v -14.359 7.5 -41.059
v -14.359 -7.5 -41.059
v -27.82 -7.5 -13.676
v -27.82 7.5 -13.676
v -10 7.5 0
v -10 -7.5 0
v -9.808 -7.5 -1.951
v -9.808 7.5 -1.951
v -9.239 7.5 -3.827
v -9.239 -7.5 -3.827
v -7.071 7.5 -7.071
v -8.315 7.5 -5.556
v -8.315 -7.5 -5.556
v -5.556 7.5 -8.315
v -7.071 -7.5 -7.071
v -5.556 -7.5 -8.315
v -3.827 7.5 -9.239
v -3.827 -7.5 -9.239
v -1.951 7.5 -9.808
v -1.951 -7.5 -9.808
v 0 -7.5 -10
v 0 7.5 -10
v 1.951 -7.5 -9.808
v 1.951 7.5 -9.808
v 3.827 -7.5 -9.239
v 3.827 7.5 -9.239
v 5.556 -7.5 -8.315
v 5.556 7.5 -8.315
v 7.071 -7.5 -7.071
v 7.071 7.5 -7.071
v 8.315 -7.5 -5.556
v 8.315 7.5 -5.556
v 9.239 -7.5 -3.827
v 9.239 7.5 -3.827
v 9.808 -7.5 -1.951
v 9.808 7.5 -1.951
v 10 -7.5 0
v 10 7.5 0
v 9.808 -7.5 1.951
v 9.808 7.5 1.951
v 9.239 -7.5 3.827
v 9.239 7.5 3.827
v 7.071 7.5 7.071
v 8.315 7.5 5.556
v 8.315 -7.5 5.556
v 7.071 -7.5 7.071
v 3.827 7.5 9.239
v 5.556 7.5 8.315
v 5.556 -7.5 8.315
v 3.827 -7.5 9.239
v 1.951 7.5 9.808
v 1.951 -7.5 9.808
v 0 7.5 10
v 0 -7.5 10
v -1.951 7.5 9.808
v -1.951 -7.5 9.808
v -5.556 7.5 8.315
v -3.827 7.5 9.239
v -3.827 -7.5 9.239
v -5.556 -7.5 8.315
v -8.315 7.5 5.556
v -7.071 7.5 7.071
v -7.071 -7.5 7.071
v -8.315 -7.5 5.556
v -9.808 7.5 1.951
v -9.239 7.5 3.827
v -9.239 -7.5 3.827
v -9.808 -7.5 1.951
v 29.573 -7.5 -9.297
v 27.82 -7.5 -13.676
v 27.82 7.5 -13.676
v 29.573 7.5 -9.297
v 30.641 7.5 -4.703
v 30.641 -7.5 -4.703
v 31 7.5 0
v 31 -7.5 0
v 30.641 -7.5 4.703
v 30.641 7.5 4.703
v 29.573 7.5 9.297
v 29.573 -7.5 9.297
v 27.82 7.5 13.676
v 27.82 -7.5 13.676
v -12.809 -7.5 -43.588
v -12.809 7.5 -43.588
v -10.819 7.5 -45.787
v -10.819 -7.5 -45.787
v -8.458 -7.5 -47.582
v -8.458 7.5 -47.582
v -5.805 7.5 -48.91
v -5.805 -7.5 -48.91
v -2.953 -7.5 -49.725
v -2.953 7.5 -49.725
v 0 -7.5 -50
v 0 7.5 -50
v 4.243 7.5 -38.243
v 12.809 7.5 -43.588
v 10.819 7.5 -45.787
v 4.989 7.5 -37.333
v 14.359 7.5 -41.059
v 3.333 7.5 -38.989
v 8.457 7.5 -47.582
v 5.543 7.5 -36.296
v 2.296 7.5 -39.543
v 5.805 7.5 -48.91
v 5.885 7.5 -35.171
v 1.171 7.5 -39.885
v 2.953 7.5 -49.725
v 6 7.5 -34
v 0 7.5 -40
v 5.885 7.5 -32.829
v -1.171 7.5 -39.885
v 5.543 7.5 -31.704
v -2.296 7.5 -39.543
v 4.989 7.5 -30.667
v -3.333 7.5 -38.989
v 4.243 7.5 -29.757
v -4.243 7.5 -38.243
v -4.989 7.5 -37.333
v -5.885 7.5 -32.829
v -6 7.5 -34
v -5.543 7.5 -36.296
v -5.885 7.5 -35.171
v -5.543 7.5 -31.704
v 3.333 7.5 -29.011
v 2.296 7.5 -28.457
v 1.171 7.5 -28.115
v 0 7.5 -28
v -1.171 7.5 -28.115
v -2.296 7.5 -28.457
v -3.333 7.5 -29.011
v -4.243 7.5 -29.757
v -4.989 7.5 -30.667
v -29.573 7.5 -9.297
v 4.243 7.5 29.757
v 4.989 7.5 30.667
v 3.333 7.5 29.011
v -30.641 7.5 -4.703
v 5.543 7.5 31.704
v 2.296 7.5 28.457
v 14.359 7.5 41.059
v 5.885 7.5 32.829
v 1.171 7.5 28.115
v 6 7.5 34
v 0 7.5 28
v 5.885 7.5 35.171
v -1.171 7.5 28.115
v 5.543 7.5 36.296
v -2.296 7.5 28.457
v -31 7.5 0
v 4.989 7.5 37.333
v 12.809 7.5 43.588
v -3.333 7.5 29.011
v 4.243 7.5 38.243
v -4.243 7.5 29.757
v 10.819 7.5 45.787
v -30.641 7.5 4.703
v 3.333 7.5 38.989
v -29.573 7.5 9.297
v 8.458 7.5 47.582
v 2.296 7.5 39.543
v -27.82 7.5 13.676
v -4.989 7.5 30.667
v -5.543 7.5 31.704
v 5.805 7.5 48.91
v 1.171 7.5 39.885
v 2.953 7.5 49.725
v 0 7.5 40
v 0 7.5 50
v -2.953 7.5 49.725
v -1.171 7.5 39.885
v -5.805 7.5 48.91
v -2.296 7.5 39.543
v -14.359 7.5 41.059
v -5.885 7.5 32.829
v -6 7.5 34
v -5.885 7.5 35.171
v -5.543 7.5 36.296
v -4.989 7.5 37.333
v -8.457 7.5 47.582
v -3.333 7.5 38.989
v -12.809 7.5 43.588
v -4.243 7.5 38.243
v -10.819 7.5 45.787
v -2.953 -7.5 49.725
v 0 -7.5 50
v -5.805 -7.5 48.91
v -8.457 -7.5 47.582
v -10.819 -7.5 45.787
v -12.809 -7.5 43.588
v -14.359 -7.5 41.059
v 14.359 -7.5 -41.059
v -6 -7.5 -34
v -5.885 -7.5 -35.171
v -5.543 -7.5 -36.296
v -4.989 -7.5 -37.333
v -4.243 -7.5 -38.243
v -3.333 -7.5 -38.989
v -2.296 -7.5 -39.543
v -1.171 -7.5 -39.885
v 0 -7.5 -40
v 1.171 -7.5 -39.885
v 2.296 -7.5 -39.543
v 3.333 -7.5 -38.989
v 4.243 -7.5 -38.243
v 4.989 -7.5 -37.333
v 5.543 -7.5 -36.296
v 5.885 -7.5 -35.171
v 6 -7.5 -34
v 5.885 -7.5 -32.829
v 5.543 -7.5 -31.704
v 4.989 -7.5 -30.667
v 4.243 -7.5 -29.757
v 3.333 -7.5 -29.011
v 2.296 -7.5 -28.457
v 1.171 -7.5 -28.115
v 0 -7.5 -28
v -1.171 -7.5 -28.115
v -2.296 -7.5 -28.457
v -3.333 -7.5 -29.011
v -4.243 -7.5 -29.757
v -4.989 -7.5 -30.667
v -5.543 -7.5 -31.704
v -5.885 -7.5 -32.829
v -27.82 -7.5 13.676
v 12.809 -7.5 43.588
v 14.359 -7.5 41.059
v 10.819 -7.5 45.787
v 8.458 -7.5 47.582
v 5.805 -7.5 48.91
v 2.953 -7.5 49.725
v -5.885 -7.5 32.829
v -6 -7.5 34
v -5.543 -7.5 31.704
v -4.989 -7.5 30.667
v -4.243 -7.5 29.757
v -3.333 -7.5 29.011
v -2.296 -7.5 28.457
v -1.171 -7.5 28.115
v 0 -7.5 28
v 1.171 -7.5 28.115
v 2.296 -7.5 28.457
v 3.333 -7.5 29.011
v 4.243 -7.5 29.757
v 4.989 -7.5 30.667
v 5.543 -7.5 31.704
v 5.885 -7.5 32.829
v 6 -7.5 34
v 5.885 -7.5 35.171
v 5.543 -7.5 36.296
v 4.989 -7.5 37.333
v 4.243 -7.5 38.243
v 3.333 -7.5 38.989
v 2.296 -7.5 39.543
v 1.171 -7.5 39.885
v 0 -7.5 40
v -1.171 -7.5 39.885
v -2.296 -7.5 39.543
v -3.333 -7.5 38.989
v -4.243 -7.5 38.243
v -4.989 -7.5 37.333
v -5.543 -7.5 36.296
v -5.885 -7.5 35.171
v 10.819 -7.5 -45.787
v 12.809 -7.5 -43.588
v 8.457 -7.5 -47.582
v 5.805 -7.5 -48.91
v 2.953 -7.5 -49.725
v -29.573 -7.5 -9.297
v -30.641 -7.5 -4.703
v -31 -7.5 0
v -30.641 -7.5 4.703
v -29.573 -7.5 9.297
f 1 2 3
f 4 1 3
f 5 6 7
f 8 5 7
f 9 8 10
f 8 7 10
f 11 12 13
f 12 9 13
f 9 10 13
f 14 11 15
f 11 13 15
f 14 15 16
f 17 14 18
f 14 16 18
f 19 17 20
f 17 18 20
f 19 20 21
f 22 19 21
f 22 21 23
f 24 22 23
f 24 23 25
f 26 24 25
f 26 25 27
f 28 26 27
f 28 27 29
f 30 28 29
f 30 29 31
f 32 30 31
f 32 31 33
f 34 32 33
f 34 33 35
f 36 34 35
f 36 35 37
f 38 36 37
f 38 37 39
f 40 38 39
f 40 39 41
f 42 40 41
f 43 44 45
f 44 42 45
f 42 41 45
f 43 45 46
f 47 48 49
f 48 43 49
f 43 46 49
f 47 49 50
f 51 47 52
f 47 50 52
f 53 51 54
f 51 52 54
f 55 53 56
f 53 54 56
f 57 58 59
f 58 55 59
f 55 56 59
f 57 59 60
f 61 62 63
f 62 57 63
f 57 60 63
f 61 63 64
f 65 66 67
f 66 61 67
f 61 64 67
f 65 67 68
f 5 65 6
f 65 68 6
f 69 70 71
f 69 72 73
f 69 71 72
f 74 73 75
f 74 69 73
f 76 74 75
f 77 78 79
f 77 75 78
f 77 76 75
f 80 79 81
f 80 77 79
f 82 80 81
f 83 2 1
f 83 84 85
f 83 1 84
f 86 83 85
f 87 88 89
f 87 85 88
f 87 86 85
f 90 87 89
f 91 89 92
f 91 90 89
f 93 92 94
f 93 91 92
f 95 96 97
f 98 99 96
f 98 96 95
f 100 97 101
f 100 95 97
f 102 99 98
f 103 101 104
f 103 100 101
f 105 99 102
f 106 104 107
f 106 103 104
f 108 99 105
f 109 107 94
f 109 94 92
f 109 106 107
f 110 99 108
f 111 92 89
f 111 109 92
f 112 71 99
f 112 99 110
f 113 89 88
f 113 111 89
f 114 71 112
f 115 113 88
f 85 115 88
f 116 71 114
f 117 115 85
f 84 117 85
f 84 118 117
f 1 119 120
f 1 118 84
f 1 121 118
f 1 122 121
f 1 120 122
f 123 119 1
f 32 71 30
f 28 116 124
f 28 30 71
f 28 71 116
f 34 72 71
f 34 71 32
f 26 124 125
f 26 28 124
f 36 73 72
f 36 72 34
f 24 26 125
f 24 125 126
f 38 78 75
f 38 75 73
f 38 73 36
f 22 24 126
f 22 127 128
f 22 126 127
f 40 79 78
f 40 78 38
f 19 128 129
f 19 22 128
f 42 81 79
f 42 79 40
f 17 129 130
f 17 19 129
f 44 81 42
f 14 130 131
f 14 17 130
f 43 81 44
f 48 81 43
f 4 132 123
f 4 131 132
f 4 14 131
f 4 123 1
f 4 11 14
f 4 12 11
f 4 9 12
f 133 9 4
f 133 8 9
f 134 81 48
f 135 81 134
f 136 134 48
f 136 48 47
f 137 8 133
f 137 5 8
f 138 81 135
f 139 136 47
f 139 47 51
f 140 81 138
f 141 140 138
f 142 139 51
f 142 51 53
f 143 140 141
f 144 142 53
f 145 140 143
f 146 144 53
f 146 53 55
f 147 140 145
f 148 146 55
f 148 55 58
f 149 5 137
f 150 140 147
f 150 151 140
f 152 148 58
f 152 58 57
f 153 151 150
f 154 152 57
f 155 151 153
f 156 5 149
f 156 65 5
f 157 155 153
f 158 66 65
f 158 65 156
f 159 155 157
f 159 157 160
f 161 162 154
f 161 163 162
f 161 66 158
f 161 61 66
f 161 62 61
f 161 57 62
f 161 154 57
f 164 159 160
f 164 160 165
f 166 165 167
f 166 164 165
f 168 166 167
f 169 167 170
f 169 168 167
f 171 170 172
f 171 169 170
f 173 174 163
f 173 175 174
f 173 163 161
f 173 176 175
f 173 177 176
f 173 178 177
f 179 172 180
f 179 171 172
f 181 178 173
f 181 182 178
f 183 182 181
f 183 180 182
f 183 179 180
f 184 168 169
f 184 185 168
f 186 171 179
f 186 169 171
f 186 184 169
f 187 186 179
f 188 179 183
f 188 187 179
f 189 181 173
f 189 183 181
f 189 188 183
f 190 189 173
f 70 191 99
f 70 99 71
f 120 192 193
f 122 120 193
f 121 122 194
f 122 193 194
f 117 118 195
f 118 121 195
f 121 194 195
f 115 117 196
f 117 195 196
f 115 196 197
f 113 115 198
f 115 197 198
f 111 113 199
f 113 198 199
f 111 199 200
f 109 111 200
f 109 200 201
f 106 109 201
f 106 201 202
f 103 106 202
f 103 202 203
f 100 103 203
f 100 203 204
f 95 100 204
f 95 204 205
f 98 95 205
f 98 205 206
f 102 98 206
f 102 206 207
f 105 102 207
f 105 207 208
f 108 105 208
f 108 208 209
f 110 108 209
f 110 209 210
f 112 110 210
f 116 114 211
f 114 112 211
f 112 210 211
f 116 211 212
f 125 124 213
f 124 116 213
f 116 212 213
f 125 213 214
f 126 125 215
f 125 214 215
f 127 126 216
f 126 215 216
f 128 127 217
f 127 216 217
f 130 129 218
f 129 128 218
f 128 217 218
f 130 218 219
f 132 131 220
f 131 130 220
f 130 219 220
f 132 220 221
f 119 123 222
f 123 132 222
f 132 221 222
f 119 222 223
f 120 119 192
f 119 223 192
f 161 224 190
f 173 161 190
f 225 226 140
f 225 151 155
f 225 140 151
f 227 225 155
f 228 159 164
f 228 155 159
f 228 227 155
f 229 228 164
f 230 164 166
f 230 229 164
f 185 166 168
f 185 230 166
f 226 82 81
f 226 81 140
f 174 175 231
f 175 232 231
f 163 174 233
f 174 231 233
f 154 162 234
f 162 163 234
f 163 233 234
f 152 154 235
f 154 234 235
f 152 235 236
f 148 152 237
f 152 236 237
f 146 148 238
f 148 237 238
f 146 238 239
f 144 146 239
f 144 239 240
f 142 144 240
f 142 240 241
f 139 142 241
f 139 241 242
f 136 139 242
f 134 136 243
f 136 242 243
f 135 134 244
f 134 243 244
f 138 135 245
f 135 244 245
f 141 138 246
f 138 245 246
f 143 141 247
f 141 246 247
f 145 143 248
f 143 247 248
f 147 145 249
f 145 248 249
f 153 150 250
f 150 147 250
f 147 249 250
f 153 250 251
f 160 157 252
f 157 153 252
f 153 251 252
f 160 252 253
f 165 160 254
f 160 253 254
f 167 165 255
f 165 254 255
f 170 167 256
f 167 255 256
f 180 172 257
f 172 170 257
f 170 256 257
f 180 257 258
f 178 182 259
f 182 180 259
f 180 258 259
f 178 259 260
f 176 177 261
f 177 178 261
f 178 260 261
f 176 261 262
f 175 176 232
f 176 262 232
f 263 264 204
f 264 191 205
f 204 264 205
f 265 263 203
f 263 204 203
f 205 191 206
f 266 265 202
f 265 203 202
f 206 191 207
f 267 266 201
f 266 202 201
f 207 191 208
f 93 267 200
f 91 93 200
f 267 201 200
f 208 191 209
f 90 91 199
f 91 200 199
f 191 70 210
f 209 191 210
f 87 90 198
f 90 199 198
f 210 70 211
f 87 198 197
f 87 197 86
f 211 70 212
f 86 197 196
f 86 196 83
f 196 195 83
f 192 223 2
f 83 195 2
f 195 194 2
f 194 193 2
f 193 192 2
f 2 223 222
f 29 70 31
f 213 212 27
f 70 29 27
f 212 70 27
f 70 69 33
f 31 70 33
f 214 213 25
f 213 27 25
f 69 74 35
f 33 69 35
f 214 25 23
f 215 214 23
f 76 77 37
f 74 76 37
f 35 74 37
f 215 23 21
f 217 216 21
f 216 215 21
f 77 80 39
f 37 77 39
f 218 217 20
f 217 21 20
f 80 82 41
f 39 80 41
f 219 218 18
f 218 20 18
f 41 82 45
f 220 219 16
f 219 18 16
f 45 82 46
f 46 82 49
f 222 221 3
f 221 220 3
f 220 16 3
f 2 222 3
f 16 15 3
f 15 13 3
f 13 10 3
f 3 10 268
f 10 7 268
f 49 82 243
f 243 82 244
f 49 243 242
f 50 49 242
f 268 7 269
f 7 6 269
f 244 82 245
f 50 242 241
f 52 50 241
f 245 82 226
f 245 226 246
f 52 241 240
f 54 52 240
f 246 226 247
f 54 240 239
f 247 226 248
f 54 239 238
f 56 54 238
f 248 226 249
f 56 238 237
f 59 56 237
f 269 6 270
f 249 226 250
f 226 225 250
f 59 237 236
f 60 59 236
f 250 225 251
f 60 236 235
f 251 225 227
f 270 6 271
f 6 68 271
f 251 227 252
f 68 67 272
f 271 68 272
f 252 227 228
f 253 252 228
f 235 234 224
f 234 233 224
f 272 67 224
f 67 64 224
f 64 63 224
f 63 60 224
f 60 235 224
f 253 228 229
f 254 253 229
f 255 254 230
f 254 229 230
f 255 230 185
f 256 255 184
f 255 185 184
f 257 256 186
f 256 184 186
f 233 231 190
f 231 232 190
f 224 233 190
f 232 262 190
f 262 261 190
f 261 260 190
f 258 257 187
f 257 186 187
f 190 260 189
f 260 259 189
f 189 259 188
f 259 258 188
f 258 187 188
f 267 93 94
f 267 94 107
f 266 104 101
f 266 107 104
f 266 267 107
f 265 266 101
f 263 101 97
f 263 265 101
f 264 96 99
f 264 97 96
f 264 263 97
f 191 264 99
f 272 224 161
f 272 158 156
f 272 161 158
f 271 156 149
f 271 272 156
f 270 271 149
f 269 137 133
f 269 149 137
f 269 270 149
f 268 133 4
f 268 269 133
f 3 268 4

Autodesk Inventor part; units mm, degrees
ref_plane "YZ Plane" through (0, 0, 0) normal (1, 0, 0) x (0, 1, 0)
ref_plane "XZ Plane" through (0, 0, 0) normal (0, 1, 0) x (-1, 0, 0)
ref_plane "XY Plane" through (0, 0, 0) normal (0, 0, 1) x (1, 0, 0)
sketch "Sketch1" plane through (0, 0, 0) normal (0, 1, 0) x (-1, 0, 0)
  circle A0 centre (0, -34) radius 6
  circle A1 centre (0, 34) radius 6
  arc A2 (14.5606, -27.3676) -> (14.3587, -41.0588) centre (0, -34) ccw construction
  circle A3 centre (0, 34) radius 16 construction
  circle A4 centre (0, 0) radius 31 construction
  arc A5 (27.82, -13.6765) -> (27.82, 13.6765) centre (0, 0) ccw
  arc A6 (14.3587, 41.0588) -> (0, 50) centre (0, 34) ccw
  line L0 (27.82, 13.6765) -> (14.3587, 41.0588)
  arc A7 (0, -50) -> (14.3587, -41.0588) centre (0, -34) ccw
  line L1 (14.3587, -41.0588) -> (27.82, -13.6765)
  line L2 (0, 34) -> (0, -34) construction
  arc A8 (-27.82, 13.6765) -> (-27.82, -13.6765) centre (0, 0) ccw
  arc A9 (0, 50) -> (-14.3587, 41.0588) centre (0, 34) ccw
  line L3 (-27.82, 13.6765) -> (-14.3587, 41.0588)
  arc A10 (-14.3587, -41.0588) -> (0, -50) centre (0, -34) ccw
  line L4 (-14.3587, -41.0588) -> (-27.82, -13.6765)
  circle A11 centre (0, 0) radius 10
  point P0 (-14.5606, -27.3676)
  dimension "d0" = 12
  dimension "d1" = 68
  dimension "d2" = 34
  dimension "d3" = 32
  dimension "d4" = 62
  dimension "d5" = 20
extrude "Extrusion1" add sketch "Sketch1" along normal mid plane 15
equation "\"d2\" = 0.5 * d1"
properties part number "base_obj5"
